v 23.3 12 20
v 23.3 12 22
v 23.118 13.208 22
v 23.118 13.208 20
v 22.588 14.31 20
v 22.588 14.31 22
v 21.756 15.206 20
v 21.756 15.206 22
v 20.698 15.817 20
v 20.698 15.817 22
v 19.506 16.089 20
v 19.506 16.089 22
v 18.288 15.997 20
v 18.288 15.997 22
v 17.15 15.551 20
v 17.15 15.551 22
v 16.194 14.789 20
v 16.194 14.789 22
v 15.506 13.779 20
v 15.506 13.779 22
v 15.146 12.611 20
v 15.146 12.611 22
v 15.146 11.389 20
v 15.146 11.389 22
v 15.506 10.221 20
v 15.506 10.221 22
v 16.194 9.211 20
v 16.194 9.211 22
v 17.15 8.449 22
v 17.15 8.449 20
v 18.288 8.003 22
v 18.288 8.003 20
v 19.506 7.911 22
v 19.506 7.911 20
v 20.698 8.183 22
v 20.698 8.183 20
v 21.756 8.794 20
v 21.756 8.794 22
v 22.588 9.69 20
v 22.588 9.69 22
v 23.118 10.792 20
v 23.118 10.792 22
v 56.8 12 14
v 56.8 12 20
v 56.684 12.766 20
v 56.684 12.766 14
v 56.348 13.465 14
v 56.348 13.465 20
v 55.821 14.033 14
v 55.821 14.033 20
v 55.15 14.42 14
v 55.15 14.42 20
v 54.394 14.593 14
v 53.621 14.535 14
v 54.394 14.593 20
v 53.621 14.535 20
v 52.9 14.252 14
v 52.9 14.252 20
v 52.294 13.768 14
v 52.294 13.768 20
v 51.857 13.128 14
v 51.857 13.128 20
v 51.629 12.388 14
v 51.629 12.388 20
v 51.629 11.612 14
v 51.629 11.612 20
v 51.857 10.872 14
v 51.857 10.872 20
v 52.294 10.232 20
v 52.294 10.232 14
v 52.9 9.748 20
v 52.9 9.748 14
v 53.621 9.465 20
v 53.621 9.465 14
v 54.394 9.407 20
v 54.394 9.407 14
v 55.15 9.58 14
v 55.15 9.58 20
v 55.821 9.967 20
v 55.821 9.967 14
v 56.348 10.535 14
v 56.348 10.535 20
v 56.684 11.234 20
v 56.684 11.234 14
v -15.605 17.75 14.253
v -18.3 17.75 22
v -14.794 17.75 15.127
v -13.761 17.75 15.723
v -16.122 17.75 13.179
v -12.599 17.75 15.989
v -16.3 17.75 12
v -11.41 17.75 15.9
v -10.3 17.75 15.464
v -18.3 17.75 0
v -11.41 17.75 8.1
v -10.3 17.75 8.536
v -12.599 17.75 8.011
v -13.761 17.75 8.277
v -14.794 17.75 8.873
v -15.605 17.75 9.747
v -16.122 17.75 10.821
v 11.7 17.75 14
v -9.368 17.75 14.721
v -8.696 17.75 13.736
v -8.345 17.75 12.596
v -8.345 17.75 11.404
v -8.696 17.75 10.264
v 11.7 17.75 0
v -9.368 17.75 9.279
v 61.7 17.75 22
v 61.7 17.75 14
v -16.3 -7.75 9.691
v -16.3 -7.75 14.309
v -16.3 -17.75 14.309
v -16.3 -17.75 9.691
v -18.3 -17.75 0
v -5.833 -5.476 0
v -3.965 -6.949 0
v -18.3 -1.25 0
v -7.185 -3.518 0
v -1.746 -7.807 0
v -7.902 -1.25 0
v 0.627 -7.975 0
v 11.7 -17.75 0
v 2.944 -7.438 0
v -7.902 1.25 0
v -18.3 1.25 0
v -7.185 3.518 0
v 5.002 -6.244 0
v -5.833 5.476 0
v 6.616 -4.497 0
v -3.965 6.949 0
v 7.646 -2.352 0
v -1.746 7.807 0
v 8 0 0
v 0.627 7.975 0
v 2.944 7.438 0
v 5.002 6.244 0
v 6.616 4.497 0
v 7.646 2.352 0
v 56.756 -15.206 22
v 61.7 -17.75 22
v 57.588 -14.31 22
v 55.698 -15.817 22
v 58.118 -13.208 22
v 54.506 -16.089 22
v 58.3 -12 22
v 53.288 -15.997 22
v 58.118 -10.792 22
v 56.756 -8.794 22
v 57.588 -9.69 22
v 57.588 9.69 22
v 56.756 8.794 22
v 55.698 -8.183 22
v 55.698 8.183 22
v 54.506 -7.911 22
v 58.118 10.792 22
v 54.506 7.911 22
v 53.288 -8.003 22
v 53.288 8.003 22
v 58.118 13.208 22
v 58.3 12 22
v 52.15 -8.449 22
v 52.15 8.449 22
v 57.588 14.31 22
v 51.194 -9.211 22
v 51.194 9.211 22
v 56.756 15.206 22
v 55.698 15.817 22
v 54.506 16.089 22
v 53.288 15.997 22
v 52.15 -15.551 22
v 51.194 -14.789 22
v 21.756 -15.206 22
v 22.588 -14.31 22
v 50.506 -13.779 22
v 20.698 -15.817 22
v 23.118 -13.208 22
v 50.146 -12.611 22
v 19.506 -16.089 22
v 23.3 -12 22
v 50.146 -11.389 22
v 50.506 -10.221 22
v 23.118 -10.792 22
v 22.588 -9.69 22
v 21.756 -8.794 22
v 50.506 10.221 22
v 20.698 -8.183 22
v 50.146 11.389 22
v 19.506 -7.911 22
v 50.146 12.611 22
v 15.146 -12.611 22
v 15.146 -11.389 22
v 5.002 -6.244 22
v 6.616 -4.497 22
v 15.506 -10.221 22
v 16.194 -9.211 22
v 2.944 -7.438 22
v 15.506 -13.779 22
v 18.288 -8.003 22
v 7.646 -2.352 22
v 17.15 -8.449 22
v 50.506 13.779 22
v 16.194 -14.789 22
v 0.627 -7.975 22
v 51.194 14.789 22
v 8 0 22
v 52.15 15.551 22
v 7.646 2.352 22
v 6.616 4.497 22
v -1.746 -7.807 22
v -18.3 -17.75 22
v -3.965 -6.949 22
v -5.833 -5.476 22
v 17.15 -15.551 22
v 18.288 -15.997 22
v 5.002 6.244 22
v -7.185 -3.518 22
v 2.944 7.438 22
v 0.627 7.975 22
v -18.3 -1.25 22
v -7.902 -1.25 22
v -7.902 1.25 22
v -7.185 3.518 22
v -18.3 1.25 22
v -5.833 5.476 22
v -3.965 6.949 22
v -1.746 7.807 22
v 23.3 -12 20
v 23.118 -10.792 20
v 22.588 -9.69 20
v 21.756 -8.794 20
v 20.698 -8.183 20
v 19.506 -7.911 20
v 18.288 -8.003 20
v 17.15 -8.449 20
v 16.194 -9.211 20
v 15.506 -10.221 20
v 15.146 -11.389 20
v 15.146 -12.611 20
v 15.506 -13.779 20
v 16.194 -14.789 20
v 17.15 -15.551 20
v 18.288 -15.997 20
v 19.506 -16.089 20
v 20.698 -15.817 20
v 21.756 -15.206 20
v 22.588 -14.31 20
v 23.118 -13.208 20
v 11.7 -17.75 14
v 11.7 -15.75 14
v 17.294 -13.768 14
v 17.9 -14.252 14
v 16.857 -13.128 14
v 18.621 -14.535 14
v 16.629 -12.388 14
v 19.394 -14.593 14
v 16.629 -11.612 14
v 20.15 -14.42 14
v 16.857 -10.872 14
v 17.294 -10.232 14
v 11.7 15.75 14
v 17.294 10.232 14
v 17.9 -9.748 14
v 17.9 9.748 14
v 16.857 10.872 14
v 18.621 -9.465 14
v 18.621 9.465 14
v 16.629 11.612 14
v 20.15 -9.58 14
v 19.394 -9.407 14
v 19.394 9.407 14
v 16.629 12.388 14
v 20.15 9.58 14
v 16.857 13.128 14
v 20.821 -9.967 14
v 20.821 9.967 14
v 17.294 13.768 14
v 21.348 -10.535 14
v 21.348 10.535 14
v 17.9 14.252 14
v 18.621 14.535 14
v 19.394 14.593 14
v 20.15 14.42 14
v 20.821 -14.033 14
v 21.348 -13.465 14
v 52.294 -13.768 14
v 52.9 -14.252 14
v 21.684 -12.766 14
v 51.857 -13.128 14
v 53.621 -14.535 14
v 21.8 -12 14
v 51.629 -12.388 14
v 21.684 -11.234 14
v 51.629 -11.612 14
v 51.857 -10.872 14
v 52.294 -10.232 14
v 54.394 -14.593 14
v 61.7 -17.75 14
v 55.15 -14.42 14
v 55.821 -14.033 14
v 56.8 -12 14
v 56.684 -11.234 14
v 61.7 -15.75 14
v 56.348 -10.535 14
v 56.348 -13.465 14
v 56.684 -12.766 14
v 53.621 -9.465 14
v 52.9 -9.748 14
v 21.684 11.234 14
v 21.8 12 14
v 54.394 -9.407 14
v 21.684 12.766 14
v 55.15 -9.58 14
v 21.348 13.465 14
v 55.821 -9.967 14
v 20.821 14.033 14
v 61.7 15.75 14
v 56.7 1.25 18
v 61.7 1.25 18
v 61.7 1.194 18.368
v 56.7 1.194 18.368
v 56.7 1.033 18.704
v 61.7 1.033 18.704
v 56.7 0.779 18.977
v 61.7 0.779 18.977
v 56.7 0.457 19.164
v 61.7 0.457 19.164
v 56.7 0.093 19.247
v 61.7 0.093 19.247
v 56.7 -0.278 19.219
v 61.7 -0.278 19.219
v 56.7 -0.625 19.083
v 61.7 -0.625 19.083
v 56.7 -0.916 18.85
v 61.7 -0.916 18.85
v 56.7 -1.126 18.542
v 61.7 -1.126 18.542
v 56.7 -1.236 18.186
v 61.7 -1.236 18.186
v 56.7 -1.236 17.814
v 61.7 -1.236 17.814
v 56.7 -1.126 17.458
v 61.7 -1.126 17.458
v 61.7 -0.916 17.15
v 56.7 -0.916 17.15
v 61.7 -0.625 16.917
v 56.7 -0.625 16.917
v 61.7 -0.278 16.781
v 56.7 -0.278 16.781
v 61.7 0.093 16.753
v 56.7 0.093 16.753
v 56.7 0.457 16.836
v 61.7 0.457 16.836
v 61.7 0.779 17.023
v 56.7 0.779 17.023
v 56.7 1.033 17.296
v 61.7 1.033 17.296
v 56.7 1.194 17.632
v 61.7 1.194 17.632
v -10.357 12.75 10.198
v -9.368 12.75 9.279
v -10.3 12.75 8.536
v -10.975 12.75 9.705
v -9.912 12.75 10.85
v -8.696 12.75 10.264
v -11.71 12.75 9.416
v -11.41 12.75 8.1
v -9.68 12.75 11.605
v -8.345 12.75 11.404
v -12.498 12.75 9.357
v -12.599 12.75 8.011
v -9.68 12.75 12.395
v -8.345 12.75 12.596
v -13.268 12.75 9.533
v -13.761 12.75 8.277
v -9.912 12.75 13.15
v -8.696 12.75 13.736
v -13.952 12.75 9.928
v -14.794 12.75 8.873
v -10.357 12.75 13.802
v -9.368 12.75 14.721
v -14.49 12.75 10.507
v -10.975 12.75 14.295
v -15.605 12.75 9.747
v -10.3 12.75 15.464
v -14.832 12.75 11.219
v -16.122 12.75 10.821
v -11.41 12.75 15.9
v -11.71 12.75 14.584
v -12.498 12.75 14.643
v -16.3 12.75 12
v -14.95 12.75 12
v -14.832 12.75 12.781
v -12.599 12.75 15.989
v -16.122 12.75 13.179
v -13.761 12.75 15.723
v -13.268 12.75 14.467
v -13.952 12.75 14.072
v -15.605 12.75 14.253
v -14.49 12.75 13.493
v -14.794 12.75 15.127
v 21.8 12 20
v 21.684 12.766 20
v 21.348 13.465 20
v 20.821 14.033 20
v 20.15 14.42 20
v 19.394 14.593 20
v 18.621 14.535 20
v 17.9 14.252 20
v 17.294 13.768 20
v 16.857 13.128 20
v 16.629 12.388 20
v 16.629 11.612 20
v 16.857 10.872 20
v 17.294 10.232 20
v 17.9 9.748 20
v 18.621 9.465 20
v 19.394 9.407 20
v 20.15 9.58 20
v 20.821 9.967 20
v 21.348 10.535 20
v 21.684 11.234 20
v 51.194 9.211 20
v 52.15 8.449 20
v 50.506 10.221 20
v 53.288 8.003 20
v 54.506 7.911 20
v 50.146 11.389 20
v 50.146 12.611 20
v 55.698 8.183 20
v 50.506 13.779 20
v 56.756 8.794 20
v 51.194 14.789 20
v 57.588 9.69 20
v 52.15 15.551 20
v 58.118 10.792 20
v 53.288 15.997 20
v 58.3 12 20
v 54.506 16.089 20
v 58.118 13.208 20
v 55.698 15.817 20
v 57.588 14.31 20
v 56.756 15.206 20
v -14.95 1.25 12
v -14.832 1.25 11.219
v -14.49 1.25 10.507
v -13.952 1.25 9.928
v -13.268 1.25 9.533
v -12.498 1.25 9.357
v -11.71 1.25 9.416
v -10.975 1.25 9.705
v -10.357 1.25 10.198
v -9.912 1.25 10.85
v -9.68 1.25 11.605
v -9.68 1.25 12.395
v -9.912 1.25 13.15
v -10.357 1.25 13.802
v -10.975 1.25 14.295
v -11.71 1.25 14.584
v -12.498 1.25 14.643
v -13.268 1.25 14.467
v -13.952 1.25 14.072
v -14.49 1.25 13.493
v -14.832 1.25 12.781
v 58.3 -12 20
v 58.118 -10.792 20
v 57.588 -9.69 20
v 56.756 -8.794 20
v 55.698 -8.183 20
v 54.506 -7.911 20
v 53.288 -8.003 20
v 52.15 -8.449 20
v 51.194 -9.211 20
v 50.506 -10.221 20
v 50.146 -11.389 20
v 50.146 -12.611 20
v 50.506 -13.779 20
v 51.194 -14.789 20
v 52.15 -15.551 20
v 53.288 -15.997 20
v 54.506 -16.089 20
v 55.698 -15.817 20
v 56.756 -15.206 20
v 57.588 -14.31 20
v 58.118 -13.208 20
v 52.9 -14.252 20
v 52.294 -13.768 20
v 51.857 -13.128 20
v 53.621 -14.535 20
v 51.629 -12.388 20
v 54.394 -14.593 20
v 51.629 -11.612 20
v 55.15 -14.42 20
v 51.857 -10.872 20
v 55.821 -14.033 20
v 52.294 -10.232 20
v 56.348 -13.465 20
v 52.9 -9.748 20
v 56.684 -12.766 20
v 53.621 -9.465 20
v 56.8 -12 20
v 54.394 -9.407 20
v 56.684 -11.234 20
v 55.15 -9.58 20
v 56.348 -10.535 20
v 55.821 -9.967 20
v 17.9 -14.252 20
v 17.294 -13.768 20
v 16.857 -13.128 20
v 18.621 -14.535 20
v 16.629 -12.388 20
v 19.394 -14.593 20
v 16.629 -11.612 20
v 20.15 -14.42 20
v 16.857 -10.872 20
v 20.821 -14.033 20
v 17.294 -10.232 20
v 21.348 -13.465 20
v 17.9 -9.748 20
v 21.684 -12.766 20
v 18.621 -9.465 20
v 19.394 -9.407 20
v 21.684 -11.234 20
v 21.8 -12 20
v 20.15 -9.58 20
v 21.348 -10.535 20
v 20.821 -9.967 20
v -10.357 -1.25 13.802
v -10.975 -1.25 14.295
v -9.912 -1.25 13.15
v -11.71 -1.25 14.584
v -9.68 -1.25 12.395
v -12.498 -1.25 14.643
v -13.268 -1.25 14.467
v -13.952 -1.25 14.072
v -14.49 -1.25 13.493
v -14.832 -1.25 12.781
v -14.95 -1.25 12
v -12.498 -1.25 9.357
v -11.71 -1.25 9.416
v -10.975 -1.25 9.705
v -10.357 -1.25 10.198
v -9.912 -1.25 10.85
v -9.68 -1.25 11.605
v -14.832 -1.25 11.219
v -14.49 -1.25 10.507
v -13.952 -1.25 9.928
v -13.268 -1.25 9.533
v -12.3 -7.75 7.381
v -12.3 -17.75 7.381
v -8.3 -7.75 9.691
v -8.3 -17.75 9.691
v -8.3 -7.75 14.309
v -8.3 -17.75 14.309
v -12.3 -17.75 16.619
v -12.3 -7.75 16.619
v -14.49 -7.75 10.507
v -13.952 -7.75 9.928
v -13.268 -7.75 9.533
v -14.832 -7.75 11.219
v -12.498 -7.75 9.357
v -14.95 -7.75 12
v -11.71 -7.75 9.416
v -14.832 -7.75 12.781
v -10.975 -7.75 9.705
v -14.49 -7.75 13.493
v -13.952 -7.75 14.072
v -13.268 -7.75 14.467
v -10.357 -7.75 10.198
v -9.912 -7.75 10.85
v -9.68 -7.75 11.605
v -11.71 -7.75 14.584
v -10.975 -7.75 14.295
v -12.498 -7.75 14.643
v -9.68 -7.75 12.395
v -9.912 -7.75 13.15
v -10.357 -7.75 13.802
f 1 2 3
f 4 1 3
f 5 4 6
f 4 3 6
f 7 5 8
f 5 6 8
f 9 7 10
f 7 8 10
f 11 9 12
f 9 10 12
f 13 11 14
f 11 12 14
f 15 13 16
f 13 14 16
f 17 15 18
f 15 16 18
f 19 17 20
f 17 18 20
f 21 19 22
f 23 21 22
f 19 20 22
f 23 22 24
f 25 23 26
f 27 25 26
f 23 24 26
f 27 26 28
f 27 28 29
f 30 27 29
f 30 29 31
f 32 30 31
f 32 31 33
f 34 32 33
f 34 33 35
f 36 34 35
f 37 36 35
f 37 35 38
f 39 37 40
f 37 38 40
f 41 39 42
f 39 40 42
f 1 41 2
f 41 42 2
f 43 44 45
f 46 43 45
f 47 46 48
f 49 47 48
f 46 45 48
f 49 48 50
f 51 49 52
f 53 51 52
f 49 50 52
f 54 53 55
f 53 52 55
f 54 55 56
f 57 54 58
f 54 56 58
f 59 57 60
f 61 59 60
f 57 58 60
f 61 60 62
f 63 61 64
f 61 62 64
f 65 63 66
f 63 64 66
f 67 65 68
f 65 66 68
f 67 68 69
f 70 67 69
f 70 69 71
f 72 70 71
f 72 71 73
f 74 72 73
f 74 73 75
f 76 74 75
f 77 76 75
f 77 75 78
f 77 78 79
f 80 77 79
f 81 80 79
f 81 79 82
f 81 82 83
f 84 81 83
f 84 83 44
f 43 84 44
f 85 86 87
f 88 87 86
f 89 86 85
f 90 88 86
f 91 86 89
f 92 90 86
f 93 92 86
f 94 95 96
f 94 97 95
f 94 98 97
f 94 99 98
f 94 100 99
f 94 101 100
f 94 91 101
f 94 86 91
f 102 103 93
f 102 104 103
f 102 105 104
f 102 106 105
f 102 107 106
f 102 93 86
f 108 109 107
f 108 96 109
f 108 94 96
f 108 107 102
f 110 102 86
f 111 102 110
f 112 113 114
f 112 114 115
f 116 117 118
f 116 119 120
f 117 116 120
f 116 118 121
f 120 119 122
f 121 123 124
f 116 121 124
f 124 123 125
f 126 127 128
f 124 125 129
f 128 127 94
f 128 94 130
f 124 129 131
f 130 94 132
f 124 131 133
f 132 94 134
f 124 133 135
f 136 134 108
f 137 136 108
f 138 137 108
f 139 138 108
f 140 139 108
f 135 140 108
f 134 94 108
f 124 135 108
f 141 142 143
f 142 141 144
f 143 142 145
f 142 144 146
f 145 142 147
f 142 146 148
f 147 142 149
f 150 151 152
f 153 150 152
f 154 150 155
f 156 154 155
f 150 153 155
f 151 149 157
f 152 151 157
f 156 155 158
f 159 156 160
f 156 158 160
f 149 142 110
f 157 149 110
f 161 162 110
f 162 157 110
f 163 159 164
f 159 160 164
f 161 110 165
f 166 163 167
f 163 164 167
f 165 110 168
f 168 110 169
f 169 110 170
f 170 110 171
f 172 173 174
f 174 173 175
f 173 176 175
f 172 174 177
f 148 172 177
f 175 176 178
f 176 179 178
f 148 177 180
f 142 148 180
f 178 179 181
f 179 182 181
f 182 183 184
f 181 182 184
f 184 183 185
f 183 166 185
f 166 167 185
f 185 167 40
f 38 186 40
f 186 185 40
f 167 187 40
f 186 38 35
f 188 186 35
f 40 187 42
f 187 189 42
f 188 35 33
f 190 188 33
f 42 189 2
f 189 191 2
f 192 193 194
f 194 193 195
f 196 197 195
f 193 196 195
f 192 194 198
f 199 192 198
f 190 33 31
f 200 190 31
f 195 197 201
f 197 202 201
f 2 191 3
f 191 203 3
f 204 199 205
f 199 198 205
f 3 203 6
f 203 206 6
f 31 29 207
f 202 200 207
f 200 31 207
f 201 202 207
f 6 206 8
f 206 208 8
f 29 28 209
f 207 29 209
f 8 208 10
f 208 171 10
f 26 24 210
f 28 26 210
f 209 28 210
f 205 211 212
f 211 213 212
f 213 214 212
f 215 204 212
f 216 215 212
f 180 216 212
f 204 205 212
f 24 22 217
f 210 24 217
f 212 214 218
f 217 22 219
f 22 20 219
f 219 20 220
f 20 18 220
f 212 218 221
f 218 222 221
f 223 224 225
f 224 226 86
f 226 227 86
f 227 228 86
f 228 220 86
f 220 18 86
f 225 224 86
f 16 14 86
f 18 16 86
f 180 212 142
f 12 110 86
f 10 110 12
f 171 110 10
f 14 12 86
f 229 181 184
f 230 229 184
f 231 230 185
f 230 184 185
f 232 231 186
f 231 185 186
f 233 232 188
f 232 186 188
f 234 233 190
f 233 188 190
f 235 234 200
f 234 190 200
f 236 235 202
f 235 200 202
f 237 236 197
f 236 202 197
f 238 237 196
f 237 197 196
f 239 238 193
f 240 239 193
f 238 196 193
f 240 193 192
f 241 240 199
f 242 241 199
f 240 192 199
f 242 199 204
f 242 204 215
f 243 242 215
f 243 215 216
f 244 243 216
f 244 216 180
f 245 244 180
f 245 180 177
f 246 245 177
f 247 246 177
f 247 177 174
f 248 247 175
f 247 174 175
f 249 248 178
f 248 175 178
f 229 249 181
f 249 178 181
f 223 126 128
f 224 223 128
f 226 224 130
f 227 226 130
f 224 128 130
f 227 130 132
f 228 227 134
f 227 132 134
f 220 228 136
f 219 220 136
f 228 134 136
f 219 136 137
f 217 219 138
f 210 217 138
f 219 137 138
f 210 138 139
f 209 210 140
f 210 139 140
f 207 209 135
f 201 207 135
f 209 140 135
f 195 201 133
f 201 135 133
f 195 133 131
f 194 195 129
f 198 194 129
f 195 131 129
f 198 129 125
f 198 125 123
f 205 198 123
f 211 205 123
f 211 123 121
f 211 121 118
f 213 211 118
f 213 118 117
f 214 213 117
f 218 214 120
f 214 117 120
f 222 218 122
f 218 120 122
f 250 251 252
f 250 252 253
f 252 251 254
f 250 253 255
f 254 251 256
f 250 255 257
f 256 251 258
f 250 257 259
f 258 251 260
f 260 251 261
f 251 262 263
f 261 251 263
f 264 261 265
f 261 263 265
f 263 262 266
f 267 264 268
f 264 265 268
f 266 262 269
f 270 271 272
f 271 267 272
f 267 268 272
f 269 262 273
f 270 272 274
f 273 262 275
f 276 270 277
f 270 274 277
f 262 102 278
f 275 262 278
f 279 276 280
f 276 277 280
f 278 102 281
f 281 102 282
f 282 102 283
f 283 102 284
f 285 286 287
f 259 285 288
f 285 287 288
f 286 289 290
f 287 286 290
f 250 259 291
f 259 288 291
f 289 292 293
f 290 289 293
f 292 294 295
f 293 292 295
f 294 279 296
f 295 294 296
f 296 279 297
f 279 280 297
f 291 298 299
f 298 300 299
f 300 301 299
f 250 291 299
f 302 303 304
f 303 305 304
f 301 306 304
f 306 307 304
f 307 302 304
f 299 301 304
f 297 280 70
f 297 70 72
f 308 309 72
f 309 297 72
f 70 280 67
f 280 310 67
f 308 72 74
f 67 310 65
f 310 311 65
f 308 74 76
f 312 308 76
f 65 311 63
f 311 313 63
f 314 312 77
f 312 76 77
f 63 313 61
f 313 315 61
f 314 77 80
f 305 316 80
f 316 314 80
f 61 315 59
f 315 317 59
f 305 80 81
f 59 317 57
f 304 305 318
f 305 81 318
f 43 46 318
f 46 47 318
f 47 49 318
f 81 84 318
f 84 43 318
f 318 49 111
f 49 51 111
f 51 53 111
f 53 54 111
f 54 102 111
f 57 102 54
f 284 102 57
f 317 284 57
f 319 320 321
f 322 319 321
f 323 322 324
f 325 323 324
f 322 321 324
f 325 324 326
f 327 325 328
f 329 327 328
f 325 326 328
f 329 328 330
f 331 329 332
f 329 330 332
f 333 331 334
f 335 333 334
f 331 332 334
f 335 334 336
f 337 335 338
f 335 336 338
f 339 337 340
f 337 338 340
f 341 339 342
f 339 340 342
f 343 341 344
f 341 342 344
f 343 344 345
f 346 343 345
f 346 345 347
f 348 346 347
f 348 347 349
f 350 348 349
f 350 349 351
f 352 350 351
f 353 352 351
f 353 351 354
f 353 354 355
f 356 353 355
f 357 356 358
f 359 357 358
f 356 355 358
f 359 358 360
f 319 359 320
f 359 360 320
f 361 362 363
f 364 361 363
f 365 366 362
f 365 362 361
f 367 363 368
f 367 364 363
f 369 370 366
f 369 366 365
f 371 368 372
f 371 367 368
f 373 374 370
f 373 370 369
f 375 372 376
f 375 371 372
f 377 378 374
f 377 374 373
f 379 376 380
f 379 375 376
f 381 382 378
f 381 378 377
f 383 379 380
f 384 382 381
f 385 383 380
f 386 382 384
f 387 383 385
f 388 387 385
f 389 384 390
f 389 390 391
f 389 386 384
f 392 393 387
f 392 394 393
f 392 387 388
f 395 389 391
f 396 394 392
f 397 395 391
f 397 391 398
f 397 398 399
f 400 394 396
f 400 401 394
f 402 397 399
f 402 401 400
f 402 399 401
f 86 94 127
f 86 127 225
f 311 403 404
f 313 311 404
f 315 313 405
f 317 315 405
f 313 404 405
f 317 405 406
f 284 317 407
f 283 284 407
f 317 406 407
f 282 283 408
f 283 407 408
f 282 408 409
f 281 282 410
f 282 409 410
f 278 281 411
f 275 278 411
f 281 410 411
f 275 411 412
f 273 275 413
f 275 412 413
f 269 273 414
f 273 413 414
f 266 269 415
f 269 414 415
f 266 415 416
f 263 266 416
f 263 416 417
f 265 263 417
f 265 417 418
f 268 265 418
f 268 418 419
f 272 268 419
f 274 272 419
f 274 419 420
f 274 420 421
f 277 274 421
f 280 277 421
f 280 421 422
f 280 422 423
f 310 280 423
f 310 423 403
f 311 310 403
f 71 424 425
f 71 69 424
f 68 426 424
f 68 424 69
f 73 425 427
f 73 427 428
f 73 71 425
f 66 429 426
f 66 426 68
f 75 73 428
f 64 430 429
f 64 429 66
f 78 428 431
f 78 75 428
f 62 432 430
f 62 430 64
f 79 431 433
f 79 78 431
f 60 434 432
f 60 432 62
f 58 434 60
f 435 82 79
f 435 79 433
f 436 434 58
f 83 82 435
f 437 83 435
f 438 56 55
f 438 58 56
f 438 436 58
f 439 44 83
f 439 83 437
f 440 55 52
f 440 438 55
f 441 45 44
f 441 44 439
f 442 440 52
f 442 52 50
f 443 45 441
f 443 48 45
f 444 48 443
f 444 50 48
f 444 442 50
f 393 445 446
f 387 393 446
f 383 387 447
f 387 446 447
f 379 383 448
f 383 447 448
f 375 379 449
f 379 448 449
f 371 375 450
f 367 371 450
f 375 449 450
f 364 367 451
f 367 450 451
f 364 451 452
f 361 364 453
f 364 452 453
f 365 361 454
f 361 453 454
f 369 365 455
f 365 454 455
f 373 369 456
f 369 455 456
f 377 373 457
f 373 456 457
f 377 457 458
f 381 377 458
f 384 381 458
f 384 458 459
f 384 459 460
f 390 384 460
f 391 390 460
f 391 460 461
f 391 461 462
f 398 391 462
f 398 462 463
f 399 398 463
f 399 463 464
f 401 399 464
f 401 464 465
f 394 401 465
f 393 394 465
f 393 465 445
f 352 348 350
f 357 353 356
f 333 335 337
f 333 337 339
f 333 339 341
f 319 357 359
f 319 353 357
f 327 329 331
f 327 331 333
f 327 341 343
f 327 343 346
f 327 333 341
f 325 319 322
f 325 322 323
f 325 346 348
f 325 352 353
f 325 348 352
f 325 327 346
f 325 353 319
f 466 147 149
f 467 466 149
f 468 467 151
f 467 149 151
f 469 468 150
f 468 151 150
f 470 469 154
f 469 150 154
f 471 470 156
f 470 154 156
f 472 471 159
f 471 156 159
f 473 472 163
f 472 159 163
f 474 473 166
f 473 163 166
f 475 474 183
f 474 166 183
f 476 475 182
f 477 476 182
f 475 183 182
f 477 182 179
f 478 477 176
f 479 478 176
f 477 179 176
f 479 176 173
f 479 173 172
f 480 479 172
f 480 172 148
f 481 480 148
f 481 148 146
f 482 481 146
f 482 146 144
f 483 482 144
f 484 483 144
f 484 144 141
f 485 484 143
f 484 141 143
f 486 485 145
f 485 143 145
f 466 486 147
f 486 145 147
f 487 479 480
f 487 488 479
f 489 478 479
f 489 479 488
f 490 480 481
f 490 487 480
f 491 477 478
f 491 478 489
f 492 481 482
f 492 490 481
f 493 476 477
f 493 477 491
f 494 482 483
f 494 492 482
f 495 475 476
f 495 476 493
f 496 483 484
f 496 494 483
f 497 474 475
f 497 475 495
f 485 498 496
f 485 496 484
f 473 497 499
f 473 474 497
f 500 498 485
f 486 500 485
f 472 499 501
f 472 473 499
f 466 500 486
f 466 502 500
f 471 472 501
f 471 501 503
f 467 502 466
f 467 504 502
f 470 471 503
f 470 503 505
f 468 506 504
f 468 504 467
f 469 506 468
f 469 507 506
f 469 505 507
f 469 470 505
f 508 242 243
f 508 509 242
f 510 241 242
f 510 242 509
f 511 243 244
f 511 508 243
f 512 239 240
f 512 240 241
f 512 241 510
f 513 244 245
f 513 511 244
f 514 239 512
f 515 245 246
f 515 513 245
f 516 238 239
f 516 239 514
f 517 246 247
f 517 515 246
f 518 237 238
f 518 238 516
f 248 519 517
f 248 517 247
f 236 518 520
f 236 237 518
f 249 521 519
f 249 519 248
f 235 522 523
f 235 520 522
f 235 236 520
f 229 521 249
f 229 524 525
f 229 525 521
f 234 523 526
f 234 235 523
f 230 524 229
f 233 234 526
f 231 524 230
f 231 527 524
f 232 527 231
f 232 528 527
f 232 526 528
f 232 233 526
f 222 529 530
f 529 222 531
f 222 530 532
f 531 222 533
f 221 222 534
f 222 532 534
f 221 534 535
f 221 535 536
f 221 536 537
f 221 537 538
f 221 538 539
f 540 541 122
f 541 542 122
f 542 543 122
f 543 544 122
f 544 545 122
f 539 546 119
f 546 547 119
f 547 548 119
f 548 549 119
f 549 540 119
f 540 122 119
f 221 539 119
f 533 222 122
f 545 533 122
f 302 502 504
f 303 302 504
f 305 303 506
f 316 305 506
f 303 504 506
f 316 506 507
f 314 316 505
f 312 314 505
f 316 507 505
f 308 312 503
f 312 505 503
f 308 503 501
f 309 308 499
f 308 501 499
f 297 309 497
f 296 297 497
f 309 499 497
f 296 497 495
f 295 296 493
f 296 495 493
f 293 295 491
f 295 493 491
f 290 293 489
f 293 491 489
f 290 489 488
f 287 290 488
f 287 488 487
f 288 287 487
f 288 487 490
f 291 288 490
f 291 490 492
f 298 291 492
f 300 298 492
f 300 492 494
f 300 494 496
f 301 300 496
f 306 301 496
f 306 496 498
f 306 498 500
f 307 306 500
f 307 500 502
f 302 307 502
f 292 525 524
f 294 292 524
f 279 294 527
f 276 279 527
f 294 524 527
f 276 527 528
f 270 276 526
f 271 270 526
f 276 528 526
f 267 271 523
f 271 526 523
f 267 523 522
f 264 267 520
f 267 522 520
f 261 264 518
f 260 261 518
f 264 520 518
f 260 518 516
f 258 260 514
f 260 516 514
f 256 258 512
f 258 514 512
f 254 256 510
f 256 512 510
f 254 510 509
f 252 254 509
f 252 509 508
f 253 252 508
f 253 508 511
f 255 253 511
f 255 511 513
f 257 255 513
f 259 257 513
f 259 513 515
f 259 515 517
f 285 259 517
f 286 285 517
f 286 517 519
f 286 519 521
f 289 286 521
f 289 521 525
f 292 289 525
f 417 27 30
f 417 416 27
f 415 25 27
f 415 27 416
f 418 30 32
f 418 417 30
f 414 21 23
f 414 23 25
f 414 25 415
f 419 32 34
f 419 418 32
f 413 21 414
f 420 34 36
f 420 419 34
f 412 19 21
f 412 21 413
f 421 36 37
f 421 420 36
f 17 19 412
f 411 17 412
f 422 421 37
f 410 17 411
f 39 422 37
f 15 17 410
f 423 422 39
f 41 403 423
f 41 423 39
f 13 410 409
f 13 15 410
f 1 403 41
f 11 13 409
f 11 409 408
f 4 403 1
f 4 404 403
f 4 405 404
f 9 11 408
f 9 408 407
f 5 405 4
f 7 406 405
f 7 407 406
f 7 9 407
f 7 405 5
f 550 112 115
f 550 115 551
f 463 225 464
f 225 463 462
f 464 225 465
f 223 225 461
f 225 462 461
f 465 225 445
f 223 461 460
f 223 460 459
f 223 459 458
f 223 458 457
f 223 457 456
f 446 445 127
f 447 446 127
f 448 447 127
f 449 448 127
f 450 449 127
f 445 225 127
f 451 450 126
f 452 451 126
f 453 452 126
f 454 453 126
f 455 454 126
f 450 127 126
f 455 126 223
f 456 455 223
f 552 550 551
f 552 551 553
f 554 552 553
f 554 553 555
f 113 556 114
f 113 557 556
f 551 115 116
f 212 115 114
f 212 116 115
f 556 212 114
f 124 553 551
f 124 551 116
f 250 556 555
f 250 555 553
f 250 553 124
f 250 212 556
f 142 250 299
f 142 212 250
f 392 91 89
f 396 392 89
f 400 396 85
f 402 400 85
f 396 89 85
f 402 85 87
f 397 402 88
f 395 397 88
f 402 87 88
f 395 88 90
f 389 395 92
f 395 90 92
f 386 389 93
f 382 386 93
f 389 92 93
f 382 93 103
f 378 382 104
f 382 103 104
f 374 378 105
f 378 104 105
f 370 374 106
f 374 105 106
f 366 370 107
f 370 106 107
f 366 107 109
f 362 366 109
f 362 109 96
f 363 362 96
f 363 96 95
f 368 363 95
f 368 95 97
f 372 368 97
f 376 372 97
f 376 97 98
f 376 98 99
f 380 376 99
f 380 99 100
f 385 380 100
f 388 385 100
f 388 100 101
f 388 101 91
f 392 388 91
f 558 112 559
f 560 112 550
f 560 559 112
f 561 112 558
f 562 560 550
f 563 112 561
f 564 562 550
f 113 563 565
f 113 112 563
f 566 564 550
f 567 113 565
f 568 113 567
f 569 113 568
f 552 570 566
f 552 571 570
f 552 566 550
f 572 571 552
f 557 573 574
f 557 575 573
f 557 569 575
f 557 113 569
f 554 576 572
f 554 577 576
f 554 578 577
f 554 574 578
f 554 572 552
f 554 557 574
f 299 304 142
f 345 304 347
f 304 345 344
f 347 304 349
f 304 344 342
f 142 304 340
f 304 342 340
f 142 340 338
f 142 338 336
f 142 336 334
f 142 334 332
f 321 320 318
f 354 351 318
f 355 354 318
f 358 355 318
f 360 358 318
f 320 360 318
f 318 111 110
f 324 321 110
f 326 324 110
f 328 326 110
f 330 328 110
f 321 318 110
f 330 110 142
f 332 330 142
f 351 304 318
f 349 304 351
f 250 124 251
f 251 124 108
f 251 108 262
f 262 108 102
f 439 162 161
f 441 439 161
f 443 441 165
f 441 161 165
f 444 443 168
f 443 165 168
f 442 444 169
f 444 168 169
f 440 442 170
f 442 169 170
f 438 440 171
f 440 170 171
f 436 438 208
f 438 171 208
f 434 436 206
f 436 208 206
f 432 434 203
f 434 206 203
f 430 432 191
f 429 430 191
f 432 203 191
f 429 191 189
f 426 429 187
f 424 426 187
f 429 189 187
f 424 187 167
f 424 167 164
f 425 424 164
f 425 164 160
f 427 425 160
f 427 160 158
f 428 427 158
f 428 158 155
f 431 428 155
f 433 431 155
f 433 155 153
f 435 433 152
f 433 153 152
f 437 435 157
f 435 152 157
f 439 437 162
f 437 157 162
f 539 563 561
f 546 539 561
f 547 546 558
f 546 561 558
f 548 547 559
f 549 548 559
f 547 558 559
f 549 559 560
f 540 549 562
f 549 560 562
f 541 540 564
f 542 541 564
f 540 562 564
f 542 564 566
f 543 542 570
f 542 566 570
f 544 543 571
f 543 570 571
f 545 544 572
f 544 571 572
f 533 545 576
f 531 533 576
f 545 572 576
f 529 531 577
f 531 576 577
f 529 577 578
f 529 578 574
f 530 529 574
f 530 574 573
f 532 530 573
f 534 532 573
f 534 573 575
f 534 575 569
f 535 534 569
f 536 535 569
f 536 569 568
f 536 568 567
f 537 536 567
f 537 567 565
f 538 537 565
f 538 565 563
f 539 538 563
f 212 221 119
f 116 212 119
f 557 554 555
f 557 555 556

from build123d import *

# Parameters (mm, degrees)
ESQUISSE1_R             = 2.1
BOSS_EXTRU_1_DEPTH      = 22
ESQUISSE2_W             = 52.543778308
ESQUISSE2_H             = 17.447246457
ENL_V_MAT_EXTRU_1_DEPTH = 42
ESQUISSE3_R             = 3.1
ESQUISSE3_R_2           = 3.6
ENL_V_MAT_EXTRU_2_DEPTH = 2
D_GAGEMENT_M51_D        = 5.3
D_GAGEMENT_M51_DEPTH    = 34
D_GAGEMENT_M51_TIP      = 1.59228064
ESQUISSE6_R             = 4
ENL_V_MAT_EXTRU_3_DEPTH = 3
ENL_V_MAT_EXTRU_4_DEPTH = 8
ESQUISSE8_R             = 1.25
ENL_V_MAT_EXTRU_5_DEPTH = 5
BOSS_EXTRU_2_START      = 2
ESQUISSE9_R             = 4
BOSS_EXTRU_2_DEPTH      = 2
BOSS_EXTRU_3_DEPTH      = 2
ESQUISSE11_R            = 2.6
ENL_V_MAT_EXTRU_6_DEPTH = 10
ESQUISSE12_R            = 4.1
ENL_V_MAT_EXTRU_7_DEPTH = 2


with BuildPart() as part:
    # Esquisse1 → Boss.-Extru.1 (new body)
    with BuildSketch(Plane.XY):
        with BuildLine():
            Line((-18.3, 1.25), (-7.901740315, 1.25))
            ThreePointArc((-7.901740315, 1.25), (8, 0), (-7.901740315, -1.25))
            Line((-7.901740315, -1.25), (-18.3, -1.25))
            Line((-18.3, -1.25), (-18.3, -15.75))
            Line((-18.3, -15.75), (61.7, -15.75))
            Line((61.7, -15.75), (61.7, 15.75))
            Line((61.7, 15.75), (-18.3, 15.75))
            Line((-18.3, 15.75), (-18.3, 1.25))
        make_face()
        with Locations((19.2, -12)):
            Circle(ESQUISSE1_R, mode=Mode.SUBTRACT)
        with Locations((54.2, -12)):
            Circle(ESQUISSE1_R, mode=Mode.SUBTRACT)
        with Locations((54.2, 12)):
            Circle(ESQUISSE1_R, mode=Mode.SUBTRACT)
        with Locations((19.2, 12)):
            Circle(ESQUISSE1_R, mode=Mode.SUBTRACT)
    extrude(amount=BOSS_EXTRU_1_DEPTH)

    # Esquisse2 → Enlèv. mat.-Extru.1 (cut)
    with BuildSketch(Plane(origin=(0, 15.75, 0), x_dir=(1, 0, 0), z_dir=(0, 1, 0))):
        with Locations((37.971889154, -5.276376771)):
            Rectangle(ESQUISSE2_W, ESQUISSE2_H)
    extrude(amount=-ENL_V_MAT_EXTRU_1_DEPTH, mode=Mode.SUBTRACT)

    # Esquisse3 → Enlèv. mat.-Extru.2 (cut)
    with BuildSketch(Plane.XY.offset(22)):
        with Locations((19.2, -12)):
            Circle(ESQUISSE3_R)
        with Locations((54.2, -12)):
            Circle(ESQUISSE3_R)
        with Locations((54.2, 12)):
            Circle(ESQUISSE3_R_2)
        with Locations((19.2, 12)):
            Circle(ESQUISSE3_R)
    extrude(amount=-ENL_V_MAT_EXTRU_2_DEPTH, mode=Mode.SUBTRACT)

    # Dégagement M51
    with Locations(Plane(origin=(0, 15.75, 0), x_dir=(1, 0, 0), z_dir=(0, 1, 0))):
        with Locations((-12.3, -12)):
            Hole(D_GAGEMENT_M51_D / 2, depth=D_GAGEMENT_M51_DEPTH)
            with Locations((0, 0, -(D_GAGEMENT_M51_DEPTH + D_GAGEMENT_M51_TIP / 2))):  # 118° drill point
                Cone(0, D_GAGEMENT_M51_D / 2, D_GAGEMENT_M51_TIP, mode=Mode.SUBTRACT)

    # Esquisse6 → Enlèv. mat.-Extru.3 (cut)
    with BuildSketch(Plane(origin=(0, 15.75, 0), x_dir=(1, 0, 0), z_dir=(0, 1, 0))):
        with Locations(Location((-12.3, -12, 0), (0, 0, 180))):
            Circle(ESQUISSE6_R)
    extrude(amount=-ENL_V_MAT_EXTRU_3_DEPTH, mode=Mode.SUBTRACT)

    # Esquisse7 → Enlèv. mat.-Extru.4 (cut)
    with BuildSketch(Plane.XZ.offset(15.75)):
        Polygon((-12.3, 16.618802154), (-16.3, 14.309401077), (-16.3, 9.690598923), (-12.3, 7.381197846), (-8.3, 9.690598923), (-8.3, 14.309401077), align=None)
    extrude(amount=-ENL_V_MAT_EXTRU_4_DEPTH, mode=Mode.SUBTRACT)

    # Esquisse8 → Enlèv. mat.-Extru.5 (cut)
    with BuildSketch(Plane(origin=(61.7, 0, 0), x_dir=(0, 0, -1), z_dir=(1, 0, 0))):
        with Locations(Location((-18, 0, 0), (0, 0, 90))):
            Circle(ESQUISSE8_R)
    extrude(amount=-ENL_V_MAT_EXTRU_5_DEPTH, mode=Mode.SUBTRACT)

    # Esquisse9 → Boss.-Extru.2 (add)
    with BuildSketch(Plane(origin=(0, 15.75, 0), x_dir=(1, 0, 0), z_dir=(0, 1, 0)).offset(BOSS_EXTRU_2_START)):
        Polygon((61.7, -22), (61.7, -14), (11.7, -14), (11.7, 0), (-18.3, 0), (-18.3, -22), align=None)
        with Locations(Location((-12.3, -12, 0), (0, 0, 180))):
            Circle(ESQUISSE9_R, mode=Mode.SUBTRACT)
    extrude(amount=-BOSS_EXTRU_2_DEPTH)

    # Esquisse10 → Boss.-Extru.3 (add)
    with BuildSketch(Plane.XZ.offset(15.75)):
        Polygon((11.7, 0), (11.7, 14), (61.7, 14), (61.7, 22), (-18.3, 22), (-18.3, 0), align=None)
        Polygon((-12.3, 16.618802154), (-16.3, 14.309401077), (-16.3, 9.690598923), (-12.3, 7.381197846), (-8.3, 9.690598923), (-8.3, 14.309401077), align=None, mode=Mode.SUBTRACT)
    extrude(amount=BOSS_EXTRU_3_DEPTH)

    # Esquisse11 → Enlèv. mat.-Extru.6 (cut)
    with BuildSketch(Plane.XY.offset(20)):
        with Locations((54.2, 12)):
            Circle(ESQUISSE11_R)
        with Locations((54.2, -12)):
            Circle(ESQUISSE11_R)
        with Locations((19.2, -12)):
            Circle(ESQUISSE11_R)
        with Locations((19.2, 12)):
            Circle(ESQUISSE11_R)
    extrude(amount=-ENL_V_MAT_EXTRU_6_DEPTH, mode=Mode.SUBTRACT)

    # Esquisse12 → Enlèv. mat.-Extru.7 (cut)
    with BuildSketch(Plane.XY.offset(22)):
        with Locations((54.2, -12)):
            Circle(ESQUISSE12_R)
        with Locations((19.2, -12)):
            Circle(ESQUISSE12_R)
        with Locations((19.2, 12)):
            Circle(ESQUISSE12_R)
        with Locations((54.2, 12)):
            Circle(ESQUISSE12_R)
    extrude(amount=-ENL_V_MAT_EXTRU_7_DEPTH, mode=Mode.SUBTRACT)


solid = part.part
